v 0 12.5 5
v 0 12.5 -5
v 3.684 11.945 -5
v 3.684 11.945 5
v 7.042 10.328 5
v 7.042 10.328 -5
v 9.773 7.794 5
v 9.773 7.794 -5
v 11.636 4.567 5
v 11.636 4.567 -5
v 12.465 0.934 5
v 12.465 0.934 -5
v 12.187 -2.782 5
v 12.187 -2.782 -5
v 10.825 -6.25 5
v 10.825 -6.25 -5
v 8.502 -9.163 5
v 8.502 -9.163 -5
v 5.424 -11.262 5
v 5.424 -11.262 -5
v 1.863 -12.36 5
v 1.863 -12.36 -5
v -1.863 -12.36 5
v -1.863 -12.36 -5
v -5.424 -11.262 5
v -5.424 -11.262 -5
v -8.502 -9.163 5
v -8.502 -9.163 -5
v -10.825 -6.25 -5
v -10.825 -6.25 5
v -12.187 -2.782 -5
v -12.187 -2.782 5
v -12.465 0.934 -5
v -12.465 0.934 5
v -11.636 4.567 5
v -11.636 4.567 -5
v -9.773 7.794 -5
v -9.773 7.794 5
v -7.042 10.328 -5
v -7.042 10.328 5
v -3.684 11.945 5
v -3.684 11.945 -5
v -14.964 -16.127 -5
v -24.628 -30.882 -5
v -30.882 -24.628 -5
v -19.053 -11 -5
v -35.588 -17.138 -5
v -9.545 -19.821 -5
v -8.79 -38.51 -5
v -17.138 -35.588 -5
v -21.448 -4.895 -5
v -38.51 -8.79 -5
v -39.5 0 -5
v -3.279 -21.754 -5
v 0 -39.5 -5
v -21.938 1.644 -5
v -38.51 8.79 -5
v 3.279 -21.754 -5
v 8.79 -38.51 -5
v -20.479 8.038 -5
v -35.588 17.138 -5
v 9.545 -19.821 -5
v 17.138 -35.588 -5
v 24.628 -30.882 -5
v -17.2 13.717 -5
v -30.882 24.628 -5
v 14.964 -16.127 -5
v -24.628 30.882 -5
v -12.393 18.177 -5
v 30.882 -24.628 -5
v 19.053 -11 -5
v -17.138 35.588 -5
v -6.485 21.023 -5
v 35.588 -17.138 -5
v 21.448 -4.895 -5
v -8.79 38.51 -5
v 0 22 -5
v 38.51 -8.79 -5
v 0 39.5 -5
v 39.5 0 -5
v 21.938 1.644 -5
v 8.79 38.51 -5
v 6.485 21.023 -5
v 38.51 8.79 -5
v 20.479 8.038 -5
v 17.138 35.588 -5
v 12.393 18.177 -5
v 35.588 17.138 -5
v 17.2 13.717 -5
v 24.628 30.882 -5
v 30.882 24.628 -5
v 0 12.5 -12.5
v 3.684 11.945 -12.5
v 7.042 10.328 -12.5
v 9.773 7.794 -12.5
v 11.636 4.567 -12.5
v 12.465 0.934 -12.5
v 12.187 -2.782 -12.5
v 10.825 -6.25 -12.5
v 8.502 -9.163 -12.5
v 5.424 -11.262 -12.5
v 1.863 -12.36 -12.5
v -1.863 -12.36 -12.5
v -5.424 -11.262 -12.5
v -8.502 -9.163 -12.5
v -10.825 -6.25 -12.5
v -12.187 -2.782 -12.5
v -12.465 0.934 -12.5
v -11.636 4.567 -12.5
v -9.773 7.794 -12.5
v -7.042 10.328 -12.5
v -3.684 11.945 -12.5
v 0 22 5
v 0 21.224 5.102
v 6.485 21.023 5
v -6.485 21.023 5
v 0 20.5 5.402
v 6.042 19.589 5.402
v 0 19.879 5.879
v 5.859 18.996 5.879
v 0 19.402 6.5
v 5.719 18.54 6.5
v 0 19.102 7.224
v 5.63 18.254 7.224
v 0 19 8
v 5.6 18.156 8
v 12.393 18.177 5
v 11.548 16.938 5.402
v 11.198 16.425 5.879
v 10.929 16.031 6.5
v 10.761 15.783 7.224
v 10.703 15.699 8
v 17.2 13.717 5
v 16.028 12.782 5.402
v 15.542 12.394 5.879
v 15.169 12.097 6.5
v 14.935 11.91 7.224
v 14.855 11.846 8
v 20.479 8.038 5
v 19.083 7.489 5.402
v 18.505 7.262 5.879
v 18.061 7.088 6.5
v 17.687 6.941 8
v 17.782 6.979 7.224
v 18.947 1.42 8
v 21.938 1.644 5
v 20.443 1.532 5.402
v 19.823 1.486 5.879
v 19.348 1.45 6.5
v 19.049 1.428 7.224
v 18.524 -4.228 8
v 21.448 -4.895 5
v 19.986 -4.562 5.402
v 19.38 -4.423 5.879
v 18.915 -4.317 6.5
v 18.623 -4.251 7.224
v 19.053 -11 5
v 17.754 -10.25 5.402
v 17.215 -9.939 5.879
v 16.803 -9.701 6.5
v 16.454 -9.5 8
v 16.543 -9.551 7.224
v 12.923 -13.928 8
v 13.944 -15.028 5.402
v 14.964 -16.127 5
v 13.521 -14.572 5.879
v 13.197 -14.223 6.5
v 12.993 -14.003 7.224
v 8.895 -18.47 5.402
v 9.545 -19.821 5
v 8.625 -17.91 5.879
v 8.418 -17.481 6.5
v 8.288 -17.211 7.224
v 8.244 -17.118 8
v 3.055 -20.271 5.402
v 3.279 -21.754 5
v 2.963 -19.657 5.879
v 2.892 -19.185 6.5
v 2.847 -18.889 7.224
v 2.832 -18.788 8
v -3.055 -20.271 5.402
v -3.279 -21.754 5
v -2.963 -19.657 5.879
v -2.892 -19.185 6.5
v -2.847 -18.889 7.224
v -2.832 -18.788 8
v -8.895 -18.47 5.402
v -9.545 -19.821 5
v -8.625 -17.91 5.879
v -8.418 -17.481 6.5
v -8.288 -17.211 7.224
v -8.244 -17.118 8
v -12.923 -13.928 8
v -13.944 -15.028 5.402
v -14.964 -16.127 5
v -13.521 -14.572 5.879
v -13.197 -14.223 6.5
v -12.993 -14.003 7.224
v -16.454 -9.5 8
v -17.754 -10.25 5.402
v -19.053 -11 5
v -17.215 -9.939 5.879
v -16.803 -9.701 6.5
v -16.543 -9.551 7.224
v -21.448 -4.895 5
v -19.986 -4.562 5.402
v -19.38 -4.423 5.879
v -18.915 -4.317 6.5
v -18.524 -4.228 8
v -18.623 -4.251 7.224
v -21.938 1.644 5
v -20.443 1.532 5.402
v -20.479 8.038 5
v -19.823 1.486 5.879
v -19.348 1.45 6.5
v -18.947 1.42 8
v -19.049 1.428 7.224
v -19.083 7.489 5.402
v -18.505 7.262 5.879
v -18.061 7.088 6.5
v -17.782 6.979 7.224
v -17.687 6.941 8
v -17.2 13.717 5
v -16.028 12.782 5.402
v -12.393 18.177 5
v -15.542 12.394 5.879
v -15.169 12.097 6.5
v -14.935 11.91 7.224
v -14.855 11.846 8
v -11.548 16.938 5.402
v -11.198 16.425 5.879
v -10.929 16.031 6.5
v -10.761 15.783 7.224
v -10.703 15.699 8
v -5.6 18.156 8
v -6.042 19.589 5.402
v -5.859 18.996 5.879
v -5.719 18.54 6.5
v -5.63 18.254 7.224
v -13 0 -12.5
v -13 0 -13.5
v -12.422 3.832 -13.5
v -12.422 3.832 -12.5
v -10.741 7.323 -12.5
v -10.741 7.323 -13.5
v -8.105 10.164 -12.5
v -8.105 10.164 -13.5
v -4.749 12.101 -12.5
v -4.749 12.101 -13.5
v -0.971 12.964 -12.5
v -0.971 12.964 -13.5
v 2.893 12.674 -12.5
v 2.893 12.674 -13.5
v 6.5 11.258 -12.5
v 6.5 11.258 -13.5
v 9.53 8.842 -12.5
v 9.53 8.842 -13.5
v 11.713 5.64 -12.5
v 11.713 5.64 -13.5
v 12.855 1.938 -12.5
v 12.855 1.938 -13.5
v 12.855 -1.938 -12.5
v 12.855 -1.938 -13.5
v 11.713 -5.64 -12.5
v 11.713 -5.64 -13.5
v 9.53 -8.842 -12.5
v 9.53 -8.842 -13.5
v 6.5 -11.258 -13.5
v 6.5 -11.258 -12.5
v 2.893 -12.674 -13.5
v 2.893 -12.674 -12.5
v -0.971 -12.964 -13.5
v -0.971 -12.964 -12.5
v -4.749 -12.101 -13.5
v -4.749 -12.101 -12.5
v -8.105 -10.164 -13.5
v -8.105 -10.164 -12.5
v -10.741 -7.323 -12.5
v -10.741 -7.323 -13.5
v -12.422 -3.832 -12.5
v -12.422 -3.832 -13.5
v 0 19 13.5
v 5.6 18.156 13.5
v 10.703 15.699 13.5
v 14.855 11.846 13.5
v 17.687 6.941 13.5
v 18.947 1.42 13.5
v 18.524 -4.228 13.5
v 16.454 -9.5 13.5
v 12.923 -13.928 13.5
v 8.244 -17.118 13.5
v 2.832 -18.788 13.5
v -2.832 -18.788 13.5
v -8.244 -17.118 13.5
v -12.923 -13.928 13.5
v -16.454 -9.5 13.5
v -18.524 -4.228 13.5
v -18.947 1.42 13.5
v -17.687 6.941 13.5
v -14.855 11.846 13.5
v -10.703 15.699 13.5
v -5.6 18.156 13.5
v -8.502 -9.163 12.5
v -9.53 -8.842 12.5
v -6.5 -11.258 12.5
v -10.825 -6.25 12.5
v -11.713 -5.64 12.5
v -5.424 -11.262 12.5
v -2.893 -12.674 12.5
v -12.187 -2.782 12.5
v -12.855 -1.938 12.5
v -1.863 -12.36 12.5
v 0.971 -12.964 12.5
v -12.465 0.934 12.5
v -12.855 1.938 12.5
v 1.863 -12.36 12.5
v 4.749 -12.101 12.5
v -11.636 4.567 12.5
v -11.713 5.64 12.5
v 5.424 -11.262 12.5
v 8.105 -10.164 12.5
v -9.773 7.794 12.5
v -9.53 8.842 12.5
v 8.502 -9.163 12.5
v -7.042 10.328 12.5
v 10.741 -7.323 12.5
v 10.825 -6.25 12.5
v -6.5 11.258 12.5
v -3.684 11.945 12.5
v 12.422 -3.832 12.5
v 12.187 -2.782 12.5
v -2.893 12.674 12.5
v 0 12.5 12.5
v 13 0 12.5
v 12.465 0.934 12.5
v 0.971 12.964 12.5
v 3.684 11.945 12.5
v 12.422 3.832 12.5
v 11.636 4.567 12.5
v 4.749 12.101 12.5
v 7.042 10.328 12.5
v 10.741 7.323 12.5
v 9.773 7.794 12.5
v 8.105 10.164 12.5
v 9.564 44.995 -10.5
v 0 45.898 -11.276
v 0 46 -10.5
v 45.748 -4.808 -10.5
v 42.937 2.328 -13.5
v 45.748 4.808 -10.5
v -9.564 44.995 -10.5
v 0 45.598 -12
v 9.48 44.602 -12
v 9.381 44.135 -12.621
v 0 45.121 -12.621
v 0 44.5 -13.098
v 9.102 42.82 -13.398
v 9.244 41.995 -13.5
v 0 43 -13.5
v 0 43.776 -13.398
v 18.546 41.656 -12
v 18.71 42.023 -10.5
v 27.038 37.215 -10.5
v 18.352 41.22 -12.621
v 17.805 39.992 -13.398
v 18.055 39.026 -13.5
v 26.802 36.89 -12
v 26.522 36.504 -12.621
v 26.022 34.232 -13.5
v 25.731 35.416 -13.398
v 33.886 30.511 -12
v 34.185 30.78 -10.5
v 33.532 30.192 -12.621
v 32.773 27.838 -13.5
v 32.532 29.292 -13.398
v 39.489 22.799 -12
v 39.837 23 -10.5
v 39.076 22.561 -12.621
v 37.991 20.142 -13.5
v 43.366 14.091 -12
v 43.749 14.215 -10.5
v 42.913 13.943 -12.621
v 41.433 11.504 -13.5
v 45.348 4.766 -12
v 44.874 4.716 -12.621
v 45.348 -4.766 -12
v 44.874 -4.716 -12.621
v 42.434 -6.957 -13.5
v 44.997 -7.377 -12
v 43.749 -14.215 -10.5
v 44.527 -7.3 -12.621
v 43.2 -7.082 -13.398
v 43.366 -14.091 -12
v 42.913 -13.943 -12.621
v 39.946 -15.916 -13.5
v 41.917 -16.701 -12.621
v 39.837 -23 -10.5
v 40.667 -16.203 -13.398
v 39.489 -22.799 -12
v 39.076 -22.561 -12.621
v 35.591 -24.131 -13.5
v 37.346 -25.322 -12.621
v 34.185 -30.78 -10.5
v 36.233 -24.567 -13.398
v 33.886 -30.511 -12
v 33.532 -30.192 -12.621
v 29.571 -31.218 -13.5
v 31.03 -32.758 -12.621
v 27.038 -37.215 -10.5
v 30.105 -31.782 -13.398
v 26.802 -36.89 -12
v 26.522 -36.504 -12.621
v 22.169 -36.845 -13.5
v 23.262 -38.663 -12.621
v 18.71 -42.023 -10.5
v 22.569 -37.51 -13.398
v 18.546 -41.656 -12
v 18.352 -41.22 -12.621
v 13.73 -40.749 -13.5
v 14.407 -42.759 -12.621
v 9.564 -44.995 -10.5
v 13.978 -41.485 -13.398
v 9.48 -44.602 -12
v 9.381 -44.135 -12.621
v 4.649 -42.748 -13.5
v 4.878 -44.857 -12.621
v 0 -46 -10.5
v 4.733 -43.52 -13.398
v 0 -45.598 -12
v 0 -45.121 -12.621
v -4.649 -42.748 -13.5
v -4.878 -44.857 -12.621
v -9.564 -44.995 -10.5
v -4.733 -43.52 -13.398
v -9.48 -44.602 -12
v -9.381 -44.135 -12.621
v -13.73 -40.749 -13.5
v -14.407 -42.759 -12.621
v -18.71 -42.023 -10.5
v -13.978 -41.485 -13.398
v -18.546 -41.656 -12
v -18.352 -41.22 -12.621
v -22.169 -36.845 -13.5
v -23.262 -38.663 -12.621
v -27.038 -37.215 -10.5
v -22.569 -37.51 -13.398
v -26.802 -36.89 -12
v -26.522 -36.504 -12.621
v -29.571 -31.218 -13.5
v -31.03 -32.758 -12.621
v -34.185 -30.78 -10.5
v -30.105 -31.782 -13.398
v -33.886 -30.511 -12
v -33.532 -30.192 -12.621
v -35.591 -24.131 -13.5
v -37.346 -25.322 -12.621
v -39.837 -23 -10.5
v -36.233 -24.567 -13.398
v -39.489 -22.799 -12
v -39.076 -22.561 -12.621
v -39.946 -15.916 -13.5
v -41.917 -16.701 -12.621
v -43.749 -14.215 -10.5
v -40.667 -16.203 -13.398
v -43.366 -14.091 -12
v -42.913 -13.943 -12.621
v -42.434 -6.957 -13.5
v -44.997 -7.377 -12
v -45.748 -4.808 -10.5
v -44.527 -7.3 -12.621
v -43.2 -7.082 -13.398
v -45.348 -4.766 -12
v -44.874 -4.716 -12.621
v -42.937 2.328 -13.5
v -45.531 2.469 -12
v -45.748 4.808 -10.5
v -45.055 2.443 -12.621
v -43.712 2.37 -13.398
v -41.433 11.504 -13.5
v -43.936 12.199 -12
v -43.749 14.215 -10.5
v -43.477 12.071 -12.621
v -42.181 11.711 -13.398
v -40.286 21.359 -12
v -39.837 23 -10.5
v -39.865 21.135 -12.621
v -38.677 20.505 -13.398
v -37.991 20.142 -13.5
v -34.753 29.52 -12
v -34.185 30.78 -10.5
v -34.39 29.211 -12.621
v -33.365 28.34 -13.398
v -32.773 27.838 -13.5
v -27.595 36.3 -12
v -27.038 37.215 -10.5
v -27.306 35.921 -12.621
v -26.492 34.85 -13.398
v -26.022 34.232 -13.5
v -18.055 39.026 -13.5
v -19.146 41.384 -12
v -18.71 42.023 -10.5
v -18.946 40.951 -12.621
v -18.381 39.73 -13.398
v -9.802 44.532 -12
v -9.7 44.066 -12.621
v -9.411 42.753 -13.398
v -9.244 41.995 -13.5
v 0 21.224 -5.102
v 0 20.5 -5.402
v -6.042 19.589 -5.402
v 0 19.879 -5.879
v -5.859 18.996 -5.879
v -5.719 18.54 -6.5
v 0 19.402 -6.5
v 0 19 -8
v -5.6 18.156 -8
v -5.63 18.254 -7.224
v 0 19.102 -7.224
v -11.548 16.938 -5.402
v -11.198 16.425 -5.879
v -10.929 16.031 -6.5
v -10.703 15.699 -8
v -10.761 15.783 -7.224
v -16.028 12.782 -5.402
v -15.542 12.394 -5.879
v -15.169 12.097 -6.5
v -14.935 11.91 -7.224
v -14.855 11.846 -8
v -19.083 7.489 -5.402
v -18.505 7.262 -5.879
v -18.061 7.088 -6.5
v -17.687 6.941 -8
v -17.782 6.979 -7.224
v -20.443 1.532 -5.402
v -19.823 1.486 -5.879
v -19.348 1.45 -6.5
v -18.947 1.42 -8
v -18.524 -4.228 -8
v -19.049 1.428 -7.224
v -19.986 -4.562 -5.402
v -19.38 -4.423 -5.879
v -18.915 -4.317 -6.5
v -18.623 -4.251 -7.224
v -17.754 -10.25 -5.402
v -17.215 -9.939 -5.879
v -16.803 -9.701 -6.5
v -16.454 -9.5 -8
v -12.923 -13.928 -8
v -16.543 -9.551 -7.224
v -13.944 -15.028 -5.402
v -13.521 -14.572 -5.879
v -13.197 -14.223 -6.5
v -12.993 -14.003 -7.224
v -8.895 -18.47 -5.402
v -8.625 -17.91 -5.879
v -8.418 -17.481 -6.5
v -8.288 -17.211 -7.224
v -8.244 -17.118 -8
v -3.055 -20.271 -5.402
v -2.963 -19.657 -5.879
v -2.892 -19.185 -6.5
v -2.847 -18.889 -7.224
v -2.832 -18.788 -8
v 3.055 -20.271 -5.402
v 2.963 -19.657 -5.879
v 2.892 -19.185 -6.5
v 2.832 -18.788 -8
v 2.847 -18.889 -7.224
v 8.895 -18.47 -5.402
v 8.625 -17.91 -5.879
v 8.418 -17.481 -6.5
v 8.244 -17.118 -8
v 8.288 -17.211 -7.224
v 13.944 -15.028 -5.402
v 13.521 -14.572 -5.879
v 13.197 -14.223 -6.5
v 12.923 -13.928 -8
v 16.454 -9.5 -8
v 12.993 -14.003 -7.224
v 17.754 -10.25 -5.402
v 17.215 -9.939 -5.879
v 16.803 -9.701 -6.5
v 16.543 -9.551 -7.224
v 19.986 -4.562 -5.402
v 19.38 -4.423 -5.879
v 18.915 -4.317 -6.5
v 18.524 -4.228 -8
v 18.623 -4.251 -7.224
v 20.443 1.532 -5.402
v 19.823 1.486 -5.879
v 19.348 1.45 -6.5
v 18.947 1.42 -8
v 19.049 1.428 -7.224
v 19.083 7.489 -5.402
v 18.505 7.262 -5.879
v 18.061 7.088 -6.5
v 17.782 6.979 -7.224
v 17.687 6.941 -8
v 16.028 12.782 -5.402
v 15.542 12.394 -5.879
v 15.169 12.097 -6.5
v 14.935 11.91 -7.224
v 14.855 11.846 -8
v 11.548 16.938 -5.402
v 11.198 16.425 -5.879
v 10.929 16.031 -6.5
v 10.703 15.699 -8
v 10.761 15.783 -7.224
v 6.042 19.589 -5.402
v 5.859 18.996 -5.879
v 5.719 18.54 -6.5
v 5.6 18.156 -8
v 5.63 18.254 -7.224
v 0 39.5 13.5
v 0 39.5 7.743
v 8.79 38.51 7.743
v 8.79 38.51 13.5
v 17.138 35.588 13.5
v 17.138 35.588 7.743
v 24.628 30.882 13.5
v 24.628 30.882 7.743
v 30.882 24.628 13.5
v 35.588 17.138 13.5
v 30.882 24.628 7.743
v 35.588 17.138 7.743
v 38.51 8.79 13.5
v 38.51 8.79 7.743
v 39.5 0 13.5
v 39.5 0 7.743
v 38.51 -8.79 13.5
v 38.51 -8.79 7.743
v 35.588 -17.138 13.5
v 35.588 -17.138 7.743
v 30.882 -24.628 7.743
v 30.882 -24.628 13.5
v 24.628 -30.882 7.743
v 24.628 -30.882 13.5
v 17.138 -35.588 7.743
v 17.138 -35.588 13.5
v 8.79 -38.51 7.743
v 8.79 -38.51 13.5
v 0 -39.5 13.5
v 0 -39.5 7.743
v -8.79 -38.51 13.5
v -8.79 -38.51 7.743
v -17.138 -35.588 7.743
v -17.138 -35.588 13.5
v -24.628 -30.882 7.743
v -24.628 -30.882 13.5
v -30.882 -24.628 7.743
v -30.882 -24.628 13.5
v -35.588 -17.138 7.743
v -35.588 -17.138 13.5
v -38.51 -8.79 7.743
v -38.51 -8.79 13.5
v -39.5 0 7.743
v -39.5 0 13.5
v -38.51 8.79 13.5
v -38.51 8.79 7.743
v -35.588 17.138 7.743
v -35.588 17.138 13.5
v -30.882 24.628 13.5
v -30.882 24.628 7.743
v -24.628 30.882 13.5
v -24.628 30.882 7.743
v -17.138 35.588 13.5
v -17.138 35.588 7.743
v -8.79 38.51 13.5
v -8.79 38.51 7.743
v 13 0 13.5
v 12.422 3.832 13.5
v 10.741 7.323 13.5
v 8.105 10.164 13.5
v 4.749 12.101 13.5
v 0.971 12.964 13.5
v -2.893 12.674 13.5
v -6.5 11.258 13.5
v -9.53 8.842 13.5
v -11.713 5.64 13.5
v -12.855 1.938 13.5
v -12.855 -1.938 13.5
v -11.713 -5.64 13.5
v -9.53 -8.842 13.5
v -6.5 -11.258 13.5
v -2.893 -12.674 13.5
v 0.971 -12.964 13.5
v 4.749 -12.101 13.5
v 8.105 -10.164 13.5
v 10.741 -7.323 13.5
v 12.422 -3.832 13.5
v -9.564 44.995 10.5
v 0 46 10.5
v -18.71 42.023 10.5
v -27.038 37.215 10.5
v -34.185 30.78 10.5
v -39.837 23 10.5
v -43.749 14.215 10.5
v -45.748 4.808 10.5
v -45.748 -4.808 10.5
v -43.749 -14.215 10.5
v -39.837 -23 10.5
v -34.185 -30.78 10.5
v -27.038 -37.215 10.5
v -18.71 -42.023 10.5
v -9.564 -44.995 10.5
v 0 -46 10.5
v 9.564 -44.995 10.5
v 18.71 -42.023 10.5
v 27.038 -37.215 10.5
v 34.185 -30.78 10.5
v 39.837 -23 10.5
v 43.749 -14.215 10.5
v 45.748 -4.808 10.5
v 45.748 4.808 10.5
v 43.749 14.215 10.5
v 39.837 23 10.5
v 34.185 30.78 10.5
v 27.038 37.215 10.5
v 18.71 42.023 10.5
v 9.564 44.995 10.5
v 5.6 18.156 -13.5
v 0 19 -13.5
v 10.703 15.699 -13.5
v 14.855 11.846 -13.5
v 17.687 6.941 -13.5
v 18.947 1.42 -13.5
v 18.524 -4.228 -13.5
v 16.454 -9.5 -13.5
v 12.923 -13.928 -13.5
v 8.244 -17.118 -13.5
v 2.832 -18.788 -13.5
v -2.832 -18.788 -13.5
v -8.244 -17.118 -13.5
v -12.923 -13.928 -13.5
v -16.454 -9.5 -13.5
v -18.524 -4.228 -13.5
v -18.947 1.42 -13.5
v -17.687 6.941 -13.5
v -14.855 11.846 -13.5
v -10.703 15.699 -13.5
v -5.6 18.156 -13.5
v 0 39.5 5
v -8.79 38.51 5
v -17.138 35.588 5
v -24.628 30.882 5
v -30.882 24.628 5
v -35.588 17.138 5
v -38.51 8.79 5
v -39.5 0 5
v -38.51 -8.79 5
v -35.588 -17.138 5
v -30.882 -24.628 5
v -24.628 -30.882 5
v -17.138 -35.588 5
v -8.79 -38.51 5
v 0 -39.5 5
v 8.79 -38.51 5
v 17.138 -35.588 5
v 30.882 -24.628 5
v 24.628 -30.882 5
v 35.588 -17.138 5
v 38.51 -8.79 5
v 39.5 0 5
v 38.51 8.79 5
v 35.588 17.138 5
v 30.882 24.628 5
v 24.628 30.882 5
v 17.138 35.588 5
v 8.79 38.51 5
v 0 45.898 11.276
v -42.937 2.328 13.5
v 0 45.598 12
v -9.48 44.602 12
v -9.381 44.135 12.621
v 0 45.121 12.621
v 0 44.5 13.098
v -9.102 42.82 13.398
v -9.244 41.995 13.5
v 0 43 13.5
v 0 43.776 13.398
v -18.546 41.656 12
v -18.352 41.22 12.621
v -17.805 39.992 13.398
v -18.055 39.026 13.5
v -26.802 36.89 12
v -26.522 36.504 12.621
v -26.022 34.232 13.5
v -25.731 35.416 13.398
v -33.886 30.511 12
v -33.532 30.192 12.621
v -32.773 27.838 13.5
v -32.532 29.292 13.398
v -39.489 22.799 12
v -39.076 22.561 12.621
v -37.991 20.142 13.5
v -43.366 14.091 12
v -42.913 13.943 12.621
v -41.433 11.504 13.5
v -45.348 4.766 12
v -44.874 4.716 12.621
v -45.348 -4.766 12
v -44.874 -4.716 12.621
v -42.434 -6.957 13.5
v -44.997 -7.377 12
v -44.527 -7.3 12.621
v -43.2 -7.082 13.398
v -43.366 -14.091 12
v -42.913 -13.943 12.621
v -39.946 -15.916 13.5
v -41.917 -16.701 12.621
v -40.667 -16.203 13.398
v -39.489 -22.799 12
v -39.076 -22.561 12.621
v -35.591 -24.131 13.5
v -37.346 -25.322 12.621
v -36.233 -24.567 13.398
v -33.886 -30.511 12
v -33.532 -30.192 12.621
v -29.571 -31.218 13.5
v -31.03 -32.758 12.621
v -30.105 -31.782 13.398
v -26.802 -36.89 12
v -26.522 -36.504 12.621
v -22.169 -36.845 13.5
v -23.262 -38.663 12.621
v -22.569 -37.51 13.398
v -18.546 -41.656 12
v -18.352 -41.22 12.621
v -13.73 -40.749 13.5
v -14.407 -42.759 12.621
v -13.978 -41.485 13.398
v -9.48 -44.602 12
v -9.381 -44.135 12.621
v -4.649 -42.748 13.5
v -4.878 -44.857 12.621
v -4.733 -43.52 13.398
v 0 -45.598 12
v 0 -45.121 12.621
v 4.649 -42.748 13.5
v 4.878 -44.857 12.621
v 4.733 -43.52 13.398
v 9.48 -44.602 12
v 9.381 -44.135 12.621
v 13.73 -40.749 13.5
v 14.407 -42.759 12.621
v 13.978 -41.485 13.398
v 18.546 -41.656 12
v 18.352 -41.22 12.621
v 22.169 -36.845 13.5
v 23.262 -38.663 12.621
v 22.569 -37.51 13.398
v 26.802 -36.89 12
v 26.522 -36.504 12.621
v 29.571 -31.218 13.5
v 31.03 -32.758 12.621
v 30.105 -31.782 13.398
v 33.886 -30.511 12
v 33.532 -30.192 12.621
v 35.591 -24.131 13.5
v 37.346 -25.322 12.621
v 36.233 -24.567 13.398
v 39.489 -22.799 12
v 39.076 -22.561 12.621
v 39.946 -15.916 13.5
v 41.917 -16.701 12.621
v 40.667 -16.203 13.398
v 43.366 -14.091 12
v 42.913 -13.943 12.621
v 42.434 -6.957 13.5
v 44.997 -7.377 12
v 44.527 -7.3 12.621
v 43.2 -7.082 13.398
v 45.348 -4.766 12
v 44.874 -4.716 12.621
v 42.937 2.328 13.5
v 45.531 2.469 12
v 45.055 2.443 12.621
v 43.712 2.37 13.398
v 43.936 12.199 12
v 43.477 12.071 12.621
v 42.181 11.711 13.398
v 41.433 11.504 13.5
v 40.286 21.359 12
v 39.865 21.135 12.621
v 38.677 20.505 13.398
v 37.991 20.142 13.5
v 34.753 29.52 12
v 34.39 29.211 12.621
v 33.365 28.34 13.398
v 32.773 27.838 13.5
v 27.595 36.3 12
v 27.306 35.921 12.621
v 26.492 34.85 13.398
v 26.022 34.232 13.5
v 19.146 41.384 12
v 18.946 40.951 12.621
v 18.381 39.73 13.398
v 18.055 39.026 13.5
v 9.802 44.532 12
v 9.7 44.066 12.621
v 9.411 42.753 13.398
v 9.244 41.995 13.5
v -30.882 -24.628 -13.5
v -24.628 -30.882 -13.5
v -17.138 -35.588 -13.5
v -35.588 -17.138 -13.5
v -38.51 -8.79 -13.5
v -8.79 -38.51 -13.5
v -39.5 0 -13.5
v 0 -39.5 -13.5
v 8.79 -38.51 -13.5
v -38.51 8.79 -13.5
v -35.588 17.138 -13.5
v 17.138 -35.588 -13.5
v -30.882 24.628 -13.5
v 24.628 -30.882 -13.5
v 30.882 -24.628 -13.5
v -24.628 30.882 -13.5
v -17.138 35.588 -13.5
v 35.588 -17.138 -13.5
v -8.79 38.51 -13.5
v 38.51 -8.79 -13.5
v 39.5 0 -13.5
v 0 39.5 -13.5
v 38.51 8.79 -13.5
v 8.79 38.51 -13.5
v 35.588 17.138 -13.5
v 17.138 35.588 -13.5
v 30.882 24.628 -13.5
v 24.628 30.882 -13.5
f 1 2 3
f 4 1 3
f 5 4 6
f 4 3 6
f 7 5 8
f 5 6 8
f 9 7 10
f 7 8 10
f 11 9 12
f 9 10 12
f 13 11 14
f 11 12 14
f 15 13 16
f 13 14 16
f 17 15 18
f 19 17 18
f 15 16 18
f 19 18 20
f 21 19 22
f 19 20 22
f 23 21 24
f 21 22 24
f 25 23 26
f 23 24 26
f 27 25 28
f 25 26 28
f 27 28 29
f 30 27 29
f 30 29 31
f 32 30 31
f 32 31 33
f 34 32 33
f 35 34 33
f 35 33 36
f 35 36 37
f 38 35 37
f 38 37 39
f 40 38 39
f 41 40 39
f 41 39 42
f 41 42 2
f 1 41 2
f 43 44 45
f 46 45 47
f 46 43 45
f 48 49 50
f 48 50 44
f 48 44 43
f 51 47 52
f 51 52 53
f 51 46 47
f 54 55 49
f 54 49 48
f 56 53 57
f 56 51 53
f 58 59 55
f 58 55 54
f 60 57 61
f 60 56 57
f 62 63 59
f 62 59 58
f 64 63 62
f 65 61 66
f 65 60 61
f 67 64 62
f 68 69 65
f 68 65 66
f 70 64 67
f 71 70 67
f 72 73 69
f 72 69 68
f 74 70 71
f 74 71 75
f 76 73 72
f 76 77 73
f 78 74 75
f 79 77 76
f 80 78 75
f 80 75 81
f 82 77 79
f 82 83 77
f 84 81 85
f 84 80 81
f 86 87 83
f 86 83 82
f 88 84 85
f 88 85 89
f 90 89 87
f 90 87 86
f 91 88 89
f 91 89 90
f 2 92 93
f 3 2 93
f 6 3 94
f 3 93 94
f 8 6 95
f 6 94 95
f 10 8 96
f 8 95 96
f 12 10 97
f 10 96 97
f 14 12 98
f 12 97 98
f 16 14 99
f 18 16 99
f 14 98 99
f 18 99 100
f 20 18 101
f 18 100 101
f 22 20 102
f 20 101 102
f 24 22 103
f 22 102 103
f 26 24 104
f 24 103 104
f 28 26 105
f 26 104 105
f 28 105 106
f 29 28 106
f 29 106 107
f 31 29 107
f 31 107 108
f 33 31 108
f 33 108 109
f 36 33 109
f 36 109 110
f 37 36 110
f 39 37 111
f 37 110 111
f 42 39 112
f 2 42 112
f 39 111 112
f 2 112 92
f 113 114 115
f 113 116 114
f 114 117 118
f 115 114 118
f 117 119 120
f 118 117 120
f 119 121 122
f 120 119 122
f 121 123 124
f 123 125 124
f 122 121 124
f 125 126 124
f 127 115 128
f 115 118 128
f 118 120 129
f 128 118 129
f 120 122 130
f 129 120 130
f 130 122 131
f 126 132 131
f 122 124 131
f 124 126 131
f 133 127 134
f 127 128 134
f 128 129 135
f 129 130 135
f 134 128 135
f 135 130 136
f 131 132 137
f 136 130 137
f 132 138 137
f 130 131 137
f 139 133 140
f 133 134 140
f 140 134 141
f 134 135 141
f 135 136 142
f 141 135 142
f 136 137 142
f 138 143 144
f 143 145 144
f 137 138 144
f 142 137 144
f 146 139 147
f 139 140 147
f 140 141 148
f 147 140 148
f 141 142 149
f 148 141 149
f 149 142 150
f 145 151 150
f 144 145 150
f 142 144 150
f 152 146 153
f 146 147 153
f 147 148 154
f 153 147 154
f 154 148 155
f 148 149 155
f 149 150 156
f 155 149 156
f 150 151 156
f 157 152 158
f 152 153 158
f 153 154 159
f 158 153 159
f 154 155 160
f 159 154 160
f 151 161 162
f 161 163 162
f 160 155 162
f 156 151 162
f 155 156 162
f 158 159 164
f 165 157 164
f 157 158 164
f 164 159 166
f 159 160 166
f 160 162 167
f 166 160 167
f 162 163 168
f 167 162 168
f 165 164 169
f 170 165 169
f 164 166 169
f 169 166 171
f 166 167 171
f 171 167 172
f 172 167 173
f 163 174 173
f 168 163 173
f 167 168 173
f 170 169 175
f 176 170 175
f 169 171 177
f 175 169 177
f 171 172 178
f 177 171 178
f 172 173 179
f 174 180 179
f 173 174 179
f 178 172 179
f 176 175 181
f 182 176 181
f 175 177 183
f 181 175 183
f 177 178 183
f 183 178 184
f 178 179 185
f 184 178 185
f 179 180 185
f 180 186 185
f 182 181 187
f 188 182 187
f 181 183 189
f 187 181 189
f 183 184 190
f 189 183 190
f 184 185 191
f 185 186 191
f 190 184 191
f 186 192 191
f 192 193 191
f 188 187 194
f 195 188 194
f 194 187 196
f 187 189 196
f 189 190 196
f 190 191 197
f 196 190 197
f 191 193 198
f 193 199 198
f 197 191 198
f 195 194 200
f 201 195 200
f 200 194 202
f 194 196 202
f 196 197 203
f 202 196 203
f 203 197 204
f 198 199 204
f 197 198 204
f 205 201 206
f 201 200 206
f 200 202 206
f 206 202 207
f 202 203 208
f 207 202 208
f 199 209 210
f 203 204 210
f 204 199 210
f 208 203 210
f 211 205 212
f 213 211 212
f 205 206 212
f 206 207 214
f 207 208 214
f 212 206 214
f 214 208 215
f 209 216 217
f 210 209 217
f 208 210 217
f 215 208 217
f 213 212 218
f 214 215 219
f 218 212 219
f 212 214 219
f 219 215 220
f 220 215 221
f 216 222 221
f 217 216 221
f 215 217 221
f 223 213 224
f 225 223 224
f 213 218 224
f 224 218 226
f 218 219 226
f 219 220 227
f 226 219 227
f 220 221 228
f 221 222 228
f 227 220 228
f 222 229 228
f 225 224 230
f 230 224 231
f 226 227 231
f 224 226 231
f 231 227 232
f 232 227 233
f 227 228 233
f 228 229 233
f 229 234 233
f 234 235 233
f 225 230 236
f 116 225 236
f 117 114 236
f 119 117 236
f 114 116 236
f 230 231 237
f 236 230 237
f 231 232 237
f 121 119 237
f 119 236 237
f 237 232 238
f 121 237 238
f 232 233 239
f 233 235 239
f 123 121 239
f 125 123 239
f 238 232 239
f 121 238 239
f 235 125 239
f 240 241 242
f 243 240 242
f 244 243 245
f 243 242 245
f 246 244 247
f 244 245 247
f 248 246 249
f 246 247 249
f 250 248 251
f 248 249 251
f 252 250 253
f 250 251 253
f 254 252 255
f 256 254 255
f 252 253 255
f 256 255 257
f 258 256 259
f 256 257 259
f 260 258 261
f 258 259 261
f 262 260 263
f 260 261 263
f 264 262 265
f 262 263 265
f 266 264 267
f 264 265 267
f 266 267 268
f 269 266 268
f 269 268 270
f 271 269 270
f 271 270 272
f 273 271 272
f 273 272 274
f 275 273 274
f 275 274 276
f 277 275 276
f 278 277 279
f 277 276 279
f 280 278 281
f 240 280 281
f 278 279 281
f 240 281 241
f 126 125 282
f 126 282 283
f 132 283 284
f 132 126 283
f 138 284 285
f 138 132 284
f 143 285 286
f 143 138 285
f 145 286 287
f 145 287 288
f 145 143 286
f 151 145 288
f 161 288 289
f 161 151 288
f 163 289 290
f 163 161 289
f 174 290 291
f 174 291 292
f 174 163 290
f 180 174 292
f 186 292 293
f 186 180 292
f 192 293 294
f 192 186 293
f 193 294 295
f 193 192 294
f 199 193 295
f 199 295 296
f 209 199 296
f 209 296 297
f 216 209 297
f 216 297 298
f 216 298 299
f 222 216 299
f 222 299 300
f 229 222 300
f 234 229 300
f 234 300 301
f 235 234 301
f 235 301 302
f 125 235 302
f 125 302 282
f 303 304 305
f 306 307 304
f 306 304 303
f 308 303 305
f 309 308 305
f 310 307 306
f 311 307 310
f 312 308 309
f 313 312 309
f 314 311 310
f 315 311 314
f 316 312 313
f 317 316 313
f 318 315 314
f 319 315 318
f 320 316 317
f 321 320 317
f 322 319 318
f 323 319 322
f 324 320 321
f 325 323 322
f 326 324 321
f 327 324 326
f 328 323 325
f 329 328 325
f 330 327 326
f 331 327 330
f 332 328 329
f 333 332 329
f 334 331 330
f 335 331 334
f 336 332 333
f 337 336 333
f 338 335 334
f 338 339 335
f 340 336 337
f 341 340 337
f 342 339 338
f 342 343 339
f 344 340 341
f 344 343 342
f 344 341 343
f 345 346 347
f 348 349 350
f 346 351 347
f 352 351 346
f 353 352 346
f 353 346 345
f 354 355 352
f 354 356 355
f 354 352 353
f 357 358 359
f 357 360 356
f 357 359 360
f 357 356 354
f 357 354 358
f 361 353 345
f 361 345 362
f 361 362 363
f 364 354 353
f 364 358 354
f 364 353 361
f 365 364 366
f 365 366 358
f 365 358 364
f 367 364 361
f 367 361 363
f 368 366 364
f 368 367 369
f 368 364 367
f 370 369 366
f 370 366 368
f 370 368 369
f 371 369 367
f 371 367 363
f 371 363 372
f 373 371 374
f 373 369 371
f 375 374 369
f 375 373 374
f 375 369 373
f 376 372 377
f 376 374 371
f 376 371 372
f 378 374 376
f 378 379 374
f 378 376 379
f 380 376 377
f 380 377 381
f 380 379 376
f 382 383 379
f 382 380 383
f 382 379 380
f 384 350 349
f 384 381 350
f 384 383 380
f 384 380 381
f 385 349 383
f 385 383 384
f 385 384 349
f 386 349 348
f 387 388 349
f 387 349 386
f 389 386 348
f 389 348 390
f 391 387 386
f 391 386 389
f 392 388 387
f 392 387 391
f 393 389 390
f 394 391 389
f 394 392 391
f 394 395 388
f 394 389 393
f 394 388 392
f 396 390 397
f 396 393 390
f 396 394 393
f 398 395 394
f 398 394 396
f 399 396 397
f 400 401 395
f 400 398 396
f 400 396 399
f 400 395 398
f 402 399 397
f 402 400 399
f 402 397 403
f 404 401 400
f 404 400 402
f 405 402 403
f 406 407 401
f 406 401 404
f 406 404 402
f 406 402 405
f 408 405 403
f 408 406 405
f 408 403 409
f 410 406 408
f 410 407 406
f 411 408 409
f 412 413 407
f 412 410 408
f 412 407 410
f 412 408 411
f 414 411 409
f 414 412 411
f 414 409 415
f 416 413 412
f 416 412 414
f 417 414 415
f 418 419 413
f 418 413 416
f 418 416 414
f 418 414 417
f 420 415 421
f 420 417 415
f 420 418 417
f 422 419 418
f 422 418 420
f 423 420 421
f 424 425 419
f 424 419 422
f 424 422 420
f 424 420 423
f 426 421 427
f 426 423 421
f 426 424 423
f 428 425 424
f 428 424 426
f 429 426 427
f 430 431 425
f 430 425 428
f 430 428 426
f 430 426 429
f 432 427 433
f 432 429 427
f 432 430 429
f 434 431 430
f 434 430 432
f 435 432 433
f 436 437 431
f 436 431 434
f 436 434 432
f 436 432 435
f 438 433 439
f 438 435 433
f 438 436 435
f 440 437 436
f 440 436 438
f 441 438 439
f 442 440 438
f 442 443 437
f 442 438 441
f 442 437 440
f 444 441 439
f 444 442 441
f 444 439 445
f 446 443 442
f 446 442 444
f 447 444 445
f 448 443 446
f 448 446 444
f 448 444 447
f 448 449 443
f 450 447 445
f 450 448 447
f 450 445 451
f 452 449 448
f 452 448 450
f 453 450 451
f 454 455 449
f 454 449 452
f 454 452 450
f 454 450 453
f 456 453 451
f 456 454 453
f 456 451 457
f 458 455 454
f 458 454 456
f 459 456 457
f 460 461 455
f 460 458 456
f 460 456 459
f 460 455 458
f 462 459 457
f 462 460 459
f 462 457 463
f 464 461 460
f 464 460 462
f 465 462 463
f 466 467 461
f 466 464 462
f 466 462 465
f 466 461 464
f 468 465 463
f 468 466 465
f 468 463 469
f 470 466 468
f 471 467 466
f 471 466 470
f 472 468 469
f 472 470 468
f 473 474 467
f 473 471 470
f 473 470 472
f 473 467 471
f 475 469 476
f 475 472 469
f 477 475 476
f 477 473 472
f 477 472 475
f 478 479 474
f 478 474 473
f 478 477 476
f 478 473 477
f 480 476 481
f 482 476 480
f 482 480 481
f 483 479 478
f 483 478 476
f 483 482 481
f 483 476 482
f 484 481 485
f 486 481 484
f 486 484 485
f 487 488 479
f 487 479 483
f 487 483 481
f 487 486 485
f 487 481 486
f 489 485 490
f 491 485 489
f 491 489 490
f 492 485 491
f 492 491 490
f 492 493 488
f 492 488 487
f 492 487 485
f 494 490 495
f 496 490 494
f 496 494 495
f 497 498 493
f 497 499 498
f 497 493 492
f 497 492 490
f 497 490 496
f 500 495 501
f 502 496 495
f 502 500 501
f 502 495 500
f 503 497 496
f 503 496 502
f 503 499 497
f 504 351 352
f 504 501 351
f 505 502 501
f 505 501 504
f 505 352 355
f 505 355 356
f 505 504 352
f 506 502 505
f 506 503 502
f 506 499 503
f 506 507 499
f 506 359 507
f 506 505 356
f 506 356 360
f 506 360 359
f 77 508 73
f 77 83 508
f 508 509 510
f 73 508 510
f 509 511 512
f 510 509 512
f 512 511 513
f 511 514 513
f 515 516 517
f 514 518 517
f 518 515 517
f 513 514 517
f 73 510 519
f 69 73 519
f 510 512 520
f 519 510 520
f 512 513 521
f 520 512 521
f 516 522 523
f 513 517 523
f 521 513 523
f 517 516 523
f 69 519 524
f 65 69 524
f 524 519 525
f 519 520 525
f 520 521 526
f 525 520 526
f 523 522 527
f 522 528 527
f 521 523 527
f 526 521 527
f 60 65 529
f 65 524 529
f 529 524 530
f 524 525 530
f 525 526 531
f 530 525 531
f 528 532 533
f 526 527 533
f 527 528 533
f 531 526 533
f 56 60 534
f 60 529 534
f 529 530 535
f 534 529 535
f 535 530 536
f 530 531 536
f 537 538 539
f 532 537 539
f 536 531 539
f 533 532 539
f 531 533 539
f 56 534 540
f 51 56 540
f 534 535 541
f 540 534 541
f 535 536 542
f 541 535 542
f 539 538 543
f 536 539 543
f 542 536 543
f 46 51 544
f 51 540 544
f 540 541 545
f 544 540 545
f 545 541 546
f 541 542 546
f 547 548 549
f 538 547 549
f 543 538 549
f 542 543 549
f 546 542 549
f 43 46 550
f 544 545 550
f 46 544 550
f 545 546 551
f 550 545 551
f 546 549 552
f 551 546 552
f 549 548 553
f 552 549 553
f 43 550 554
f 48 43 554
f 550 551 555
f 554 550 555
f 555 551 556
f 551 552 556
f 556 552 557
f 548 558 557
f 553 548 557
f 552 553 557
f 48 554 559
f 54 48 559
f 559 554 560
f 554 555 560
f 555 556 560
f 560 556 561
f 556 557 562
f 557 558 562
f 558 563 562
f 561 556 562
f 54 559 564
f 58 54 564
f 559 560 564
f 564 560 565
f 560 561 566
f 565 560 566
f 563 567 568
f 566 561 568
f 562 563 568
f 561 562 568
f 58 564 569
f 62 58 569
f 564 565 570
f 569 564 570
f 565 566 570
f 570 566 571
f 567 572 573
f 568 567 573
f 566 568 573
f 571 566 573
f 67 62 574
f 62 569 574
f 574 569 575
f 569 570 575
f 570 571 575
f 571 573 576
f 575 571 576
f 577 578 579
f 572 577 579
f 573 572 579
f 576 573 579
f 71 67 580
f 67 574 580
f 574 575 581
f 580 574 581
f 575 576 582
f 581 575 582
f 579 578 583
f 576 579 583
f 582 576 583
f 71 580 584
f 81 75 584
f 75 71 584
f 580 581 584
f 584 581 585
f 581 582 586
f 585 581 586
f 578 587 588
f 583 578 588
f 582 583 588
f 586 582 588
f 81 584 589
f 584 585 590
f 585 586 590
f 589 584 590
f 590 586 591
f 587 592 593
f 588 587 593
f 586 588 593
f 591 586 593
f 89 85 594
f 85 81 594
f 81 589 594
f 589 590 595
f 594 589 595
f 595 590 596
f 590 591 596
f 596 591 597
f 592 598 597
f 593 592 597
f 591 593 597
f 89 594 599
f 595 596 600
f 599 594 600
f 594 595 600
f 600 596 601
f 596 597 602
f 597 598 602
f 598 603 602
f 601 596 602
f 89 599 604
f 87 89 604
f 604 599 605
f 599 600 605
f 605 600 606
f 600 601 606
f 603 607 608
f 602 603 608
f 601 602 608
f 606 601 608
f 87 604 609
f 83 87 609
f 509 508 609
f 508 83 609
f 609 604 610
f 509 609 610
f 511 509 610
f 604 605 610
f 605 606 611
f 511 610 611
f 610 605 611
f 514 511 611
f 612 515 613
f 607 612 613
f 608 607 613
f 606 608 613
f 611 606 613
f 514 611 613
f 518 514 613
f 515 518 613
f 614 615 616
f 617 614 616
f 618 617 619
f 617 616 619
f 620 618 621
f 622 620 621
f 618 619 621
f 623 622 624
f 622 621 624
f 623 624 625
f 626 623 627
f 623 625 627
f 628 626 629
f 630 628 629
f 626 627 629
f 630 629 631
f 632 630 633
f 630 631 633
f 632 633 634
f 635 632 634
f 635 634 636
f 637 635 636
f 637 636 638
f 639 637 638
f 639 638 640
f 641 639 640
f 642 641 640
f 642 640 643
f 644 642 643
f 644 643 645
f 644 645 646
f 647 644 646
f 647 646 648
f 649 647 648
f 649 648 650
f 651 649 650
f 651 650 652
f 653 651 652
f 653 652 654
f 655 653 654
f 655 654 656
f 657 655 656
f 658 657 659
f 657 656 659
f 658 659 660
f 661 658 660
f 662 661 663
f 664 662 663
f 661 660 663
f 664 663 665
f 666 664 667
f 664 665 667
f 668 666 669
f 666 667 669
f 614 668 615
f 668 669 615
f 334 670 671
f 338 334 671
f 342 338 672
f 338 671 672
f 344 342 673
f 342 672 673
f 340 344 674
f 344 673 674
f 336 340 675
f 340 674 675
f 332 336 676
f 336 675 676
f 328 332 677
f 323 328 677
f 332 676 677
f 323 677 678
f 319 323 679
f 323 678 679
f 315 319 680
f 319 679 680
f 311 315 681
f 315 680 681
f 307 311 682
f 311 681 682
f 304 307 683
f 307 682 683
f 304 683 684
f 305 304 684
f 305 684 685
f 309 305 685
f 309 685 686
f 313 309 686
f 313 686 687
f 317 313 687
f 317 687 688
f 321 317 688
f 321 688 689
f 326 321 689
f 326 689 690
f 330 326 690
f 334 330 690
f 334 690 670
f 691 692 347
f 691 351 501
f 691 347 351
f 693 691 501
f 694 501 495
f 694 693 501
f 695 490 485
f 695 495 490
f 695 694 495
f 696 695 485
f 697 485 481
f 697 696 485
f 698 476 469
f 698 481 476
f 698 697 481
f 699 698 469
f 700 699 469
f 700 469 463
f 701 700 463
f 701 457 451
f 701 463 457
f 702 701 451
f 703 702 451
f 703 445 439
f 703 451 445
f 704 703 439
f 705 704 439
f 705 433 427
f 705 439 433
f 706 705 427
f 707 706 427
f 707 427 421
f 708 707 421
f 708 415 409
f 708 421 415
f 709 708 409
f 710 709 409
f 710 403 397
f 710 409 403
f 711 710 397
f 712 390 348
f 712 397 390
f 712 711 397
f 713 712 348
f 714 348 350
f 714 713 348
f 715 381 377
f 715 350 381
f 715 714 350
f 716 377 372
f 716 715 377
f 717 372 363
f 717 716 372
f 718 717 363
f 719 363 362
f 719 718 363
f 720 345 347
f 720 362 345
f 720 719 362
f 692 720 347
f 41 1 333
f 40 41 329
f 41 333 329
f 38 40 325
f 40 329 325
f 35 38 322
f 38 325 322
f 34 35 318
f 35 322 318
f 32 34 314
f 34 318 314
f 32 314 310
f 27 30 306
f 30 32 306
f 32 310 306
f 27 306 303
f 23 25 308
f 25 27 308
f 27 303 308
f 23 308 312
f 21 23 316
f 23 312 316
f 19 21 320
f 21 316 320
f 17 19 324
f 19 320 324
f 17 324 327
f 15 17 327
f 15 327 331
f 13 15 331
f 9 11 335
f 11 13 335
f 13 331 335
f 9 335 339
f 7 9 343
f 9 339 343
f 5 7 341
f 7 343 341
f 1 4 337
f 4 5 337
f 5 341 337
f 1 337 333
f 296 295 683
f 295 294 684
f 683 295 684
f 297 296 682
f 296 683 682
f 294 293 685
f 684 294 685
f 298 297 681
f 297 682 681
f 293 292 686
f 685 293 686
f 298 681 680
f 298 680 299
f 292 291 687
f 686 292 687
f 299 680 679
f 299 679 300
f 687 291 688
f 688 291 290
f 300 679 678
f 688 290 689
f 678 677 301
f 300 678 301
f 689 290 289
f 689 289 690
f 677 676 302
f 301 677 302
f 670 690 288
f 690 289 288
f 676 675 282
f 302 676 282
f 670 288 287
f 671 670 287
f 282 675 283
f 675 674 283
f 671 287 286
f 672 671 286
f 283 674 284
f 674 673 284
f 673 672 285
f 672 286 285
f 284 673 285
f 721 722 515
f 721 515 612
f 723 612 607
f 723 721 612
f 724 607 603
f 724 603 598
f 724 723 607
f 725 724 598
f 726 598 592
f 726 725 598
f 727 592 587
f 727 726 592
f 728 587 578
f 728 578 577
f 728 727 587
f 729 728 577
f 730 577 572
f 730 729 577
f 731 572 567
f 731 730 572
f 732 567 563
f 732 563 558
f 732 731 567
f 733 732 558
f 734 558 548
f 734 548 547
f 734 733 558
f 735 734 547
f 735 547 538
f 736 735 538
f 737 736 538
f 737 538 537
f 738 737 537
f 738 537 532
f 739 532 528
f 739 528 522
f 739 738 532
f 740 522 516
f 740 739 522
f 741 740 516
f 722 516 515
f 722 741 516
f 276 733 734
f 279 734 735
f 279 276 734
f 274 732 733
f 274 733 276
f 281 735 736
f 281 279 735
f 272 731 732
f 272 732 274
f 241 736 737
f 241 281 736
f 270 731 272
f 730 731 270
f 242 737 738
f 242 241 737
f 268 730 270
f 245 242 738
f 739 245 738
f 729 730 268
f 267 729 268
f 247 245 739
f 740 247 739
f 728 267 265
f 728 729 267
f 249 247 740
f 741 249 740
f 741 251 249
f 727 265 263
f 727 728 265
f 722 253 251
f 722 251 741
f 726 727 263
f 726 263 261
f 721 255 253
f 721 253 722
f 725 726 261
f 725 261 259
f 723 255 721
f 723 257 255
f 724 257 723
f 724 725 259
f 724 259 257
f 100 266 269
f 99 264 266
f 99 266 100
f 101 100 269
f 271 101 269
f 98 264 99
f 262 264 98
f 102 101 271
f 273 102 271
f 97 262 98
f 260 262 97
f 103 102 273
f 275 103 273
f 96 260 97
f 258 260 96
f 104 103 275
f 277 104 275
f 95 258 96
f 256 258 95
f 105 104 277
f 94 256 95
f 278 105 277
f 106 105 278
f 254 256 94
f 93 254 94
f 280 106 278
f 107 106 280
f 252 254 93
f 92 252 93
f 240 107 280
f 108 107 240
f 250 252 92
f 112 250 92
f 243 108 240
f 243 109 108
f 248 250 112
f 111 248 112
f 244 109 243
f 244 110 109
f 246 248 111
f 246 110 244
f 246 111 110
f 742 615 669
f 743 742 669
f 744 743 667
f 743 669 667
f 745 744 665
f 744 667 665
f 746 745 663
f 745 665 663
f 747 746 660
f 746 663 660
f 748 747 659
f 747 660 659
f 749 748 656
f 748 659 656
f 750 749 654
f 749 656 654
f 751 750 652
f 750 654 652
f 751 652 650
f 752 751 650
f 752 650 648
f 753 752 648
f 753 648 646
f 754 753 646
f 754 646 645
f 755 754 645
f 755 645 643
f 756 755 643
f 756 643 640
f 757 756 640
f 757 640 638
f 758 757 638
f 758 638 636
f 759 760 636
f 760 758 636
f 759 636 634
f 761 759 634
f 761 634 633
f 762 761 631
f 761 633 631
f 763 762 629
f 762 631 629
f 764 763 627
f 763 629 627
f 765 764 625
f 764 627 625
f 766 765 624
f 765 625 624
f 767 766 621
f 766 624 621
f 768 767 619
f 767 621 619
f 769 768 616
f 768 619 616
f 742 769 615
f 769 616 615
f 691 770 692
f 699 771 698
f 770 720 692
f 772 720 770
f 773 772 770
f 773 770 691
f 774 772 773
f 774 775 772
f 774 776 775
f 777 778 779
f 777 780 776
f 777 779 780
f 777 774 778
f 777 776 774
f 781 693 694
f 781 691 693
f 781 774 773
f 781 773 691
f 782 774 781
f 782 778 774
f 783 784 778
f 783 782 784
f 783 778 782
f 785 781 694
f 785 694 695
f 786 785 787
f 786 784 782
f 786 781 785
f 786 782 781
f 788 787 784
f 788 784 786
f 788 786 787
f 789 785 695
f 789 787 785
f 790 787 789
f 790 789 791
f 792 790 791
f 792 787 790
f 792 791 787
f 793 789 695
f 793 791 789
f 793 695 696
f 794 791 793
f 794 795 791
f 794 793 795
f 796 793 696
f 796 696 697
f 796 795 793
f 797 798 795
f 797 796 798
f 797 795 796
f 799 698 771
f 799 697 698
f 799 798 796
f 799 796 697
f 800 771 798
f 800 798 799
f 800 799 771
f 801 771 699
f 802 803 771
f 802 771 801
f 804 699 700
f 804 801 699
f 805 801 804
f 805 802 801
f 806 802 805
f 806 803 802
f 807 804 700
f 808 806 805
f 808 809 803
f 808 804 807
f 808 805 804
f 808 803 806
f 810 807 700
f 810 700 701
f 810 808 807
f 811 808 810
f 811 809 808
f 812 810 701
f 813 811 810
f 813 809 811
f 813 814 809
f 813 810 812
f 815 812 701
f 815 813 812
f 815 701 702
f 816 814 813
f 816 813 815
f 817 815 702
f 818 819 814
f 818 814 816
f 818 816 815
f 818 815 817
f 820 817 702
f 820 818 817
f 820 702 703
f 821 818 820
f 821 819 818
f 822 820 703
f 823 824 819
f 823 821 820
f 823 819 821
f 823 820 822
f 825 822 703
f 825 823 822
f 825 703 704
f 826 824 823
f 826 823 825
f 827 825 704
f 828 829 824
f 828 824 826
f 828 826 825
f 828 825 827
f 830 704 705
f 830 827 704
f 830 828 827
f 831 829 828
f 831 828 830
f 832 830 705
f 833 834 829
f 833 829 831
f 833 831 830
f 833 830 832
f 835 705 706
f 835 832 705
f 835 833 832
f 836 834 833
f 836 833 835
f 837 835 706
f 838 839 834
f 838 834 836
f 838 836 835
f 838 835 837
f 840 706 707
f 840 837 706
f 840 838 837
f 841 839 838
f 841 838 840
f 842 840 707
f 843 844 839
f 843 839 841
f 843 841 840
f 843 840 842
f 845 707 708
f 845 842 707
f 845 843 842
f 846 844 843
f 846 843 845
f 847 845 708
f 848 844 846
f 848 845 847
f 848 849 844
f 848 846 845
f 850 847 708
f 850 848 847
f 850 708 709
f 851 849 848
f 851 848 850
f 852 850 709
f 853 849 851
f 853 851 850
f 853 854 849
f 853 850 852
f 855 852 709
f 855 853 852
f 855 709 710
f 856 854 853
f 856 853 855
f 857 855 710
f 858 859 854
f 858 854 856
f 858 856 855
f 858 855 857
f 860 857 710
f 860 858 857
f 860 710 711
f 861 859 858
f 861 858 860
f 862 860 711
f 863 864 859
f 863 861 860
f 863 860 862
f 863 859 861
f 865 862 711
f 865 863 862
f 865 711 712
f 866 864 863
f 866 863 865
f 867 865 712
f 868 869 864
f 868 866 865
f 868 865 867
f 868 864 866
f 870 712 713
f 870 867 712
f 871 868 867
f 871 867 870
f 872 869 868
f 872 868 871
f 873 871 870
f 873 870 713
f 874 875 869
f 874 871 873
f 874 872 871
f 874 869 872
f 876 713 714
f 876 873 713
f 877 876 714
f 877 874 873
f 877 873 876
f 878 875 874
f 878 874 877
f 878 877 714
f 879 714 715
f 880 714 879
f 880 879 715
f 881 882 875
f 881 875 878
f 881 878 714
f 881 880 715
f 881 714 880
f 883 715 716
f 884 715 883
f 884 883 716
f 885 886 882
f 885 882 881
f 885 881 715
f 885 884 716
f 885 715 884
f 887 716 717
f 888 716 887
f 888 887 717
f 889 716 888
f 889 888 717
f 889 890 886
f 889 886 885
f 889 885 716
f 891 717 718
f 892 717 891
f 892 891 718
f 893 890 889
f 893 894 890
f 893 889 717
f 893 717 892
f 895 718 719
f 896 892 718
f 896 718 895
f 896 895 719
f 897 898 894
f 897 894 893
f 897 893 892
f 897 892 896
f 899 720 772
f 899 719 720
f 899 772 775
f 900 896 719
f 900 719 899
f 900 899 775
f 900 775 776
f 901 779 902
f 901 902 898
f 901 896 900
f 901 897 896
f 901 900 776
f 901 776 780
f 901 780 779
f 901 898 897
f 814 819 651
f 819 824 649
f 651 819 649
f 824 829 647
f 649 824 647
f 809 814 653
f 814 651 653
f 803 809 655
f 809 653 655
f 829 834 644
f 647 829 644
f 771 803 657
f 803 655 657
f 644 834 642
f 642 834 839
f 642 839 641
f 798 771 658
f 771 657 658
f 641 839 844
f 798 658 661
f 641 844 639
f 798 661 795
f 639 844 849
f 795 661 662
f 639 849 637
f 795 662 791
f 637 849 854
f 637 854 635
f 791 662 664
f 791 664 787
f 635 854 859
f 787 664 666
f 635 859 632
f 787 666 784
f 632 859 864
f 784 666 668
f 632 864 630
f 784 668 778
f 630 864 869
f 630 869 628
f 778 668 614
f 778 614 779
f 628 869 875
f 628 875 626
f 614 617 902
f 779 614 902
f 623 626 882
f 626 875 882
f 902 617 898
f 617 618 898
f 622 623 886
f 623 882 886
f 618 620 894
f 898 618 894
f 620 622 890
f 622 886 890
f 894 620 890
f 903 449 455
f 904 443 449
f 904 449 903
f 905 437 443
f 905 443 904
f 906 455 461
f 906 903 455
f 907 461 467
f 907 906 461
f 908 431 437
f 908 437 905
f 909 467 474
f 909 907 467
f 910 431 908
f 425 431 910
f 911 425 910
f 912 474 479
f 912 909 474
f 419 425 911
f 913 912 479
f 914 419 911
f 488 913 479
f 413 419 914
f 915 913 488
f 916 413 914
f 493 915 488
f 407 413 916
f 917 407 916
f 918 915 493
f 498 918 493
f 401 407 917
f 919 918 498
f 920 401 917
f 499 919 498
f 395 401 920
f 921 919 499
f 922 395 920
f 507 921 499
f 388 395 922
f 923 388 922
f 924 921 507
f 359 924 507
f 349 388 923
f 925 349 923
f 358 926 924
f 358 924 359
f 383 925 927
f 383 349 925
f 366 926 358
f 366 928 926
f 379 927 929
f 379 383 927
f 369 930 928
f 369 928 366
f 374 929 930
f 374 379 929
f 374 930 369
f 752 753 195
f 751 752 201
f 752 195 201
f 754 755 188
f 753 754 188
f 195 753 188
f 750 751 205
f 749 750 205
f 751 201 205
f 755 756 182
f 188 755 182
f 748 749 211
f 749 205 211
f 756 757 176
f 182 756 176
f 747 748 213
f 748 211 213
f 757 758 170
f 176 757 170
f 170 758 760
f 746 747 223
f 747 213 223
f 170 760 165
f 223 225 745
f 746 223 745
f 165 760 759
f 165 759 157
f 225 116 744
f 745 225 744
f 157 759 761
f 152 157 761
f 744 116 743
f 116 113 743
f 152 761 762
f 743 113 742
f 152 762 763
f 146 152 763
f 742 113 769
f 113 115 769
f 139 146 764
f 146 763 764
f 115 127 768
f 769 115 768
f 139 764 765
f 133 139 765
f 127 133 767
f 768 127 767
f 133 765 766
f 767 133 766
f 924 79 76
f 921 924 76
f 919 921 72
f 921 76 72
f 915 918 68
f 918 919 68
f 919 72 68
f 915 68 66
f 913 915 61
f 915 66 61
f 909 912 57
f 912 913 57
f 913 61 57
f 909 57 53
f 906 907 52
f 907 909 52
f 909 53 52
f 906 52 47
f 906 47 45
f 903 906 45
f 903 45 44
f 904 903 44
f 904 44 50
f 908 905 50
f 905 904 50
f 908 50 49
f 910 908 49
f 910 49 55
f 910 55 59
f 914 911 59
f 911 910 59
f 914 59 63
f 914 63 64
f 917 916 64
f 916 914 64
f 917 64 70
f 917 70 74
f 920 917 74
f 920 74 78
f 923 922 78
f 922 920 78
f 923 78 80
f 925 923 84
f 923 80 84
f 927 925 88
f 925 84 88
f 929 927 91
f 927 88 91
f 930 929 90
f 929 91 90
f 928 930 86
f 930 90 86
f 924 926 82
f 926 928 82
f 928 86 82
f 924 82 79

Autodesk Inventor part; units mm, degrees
ref_plane "YZ Plane" through (0, 0, 0) normal (1, 0, 0) x (0, 1, 0)
ref_plane "XZ Plane" through (0, 0, 0) normal (0, 1, 0) x (-1, 0, 0)
ref_plane "XY Plane" through (0, 0, 0) normal (0, 0, 1) x (1, 0, 0)
sketch "스케치1" plane through (0, 0, 0) normal (1, 0, 0) x (0, 1, 0)
  line L0 (46, 13.5) -> (0, 13.5)
  line L1 (0, 13.5) -> (0, -13.5)
  line L2 (0, -13.5) -> (46, -13.5)
  line L3 (46, -13.5) -> (46, 13.5)
  line L4 (39.5, 13.5) -> (39.5, 7.7432)
  line L5 (39.5, 5) -> (19, 5)
  line L6 (12.5, 5) -> (12.5, -5)
  line L7 (19, -5) -> (39.5, -5)
  line L8 (46, -5) -> (46, 5)
  line L9 (12.5, 5) -> (12.5, 13.5)
  line L10 (12.5, -5) -> (12.5, -13.5)
  line L11 (19, 13.5) -> (19, 5)
  line L12 (19, -5) -> (19, -13.5)
  line L13 (39.5, 5) -> (39.5, 7.7432)
  line L14 (39.5, -13.5) -> (39.5, -5)
  point P0 (0, 0)
  dimension "d0" = 27
  dimension "d1" = 13.5
  dimension "d2" = 46
  dimension "d3" = 10
  dimension "d4" = 5
  dimension "d5" = 12.5
  dimension "d7" = 39.5
  dimension "d8" = 39.5
revolve "회전1" add sketch "스케치1" angle 360 about axis through (0, 0, 13.5) along (0, 0, -1) contours L3 L2 L14 L7 L12 L10 L6 L9 L0 L11 L5 L13 L4
sketch "스케치2" plane through (0, 0, 13.5) normal (0, 0, 1) x (1, 0, 0)
  circle A0 centre (0, 0) radius 13
  dimension "d10" = 26
extrude "돌출1" cut sketch "스케치2" against normal blind 1
sketch "스케치3" plane through (0, 0, -13.5) normal (0, 0, -1) x (-1, 0, 0)
  circle A0 centre (0, 0) radius 13
  dimension "d13" = 26
extrude "돌출2" cut sketch "스케치3" against normal blind 1
fillet "모깎기1" radius 3 4 edges at (0, -46, 13.5) (0, -46, -13.5) (0, -19, 5) (0, -19, -5)
properties part number "2"
